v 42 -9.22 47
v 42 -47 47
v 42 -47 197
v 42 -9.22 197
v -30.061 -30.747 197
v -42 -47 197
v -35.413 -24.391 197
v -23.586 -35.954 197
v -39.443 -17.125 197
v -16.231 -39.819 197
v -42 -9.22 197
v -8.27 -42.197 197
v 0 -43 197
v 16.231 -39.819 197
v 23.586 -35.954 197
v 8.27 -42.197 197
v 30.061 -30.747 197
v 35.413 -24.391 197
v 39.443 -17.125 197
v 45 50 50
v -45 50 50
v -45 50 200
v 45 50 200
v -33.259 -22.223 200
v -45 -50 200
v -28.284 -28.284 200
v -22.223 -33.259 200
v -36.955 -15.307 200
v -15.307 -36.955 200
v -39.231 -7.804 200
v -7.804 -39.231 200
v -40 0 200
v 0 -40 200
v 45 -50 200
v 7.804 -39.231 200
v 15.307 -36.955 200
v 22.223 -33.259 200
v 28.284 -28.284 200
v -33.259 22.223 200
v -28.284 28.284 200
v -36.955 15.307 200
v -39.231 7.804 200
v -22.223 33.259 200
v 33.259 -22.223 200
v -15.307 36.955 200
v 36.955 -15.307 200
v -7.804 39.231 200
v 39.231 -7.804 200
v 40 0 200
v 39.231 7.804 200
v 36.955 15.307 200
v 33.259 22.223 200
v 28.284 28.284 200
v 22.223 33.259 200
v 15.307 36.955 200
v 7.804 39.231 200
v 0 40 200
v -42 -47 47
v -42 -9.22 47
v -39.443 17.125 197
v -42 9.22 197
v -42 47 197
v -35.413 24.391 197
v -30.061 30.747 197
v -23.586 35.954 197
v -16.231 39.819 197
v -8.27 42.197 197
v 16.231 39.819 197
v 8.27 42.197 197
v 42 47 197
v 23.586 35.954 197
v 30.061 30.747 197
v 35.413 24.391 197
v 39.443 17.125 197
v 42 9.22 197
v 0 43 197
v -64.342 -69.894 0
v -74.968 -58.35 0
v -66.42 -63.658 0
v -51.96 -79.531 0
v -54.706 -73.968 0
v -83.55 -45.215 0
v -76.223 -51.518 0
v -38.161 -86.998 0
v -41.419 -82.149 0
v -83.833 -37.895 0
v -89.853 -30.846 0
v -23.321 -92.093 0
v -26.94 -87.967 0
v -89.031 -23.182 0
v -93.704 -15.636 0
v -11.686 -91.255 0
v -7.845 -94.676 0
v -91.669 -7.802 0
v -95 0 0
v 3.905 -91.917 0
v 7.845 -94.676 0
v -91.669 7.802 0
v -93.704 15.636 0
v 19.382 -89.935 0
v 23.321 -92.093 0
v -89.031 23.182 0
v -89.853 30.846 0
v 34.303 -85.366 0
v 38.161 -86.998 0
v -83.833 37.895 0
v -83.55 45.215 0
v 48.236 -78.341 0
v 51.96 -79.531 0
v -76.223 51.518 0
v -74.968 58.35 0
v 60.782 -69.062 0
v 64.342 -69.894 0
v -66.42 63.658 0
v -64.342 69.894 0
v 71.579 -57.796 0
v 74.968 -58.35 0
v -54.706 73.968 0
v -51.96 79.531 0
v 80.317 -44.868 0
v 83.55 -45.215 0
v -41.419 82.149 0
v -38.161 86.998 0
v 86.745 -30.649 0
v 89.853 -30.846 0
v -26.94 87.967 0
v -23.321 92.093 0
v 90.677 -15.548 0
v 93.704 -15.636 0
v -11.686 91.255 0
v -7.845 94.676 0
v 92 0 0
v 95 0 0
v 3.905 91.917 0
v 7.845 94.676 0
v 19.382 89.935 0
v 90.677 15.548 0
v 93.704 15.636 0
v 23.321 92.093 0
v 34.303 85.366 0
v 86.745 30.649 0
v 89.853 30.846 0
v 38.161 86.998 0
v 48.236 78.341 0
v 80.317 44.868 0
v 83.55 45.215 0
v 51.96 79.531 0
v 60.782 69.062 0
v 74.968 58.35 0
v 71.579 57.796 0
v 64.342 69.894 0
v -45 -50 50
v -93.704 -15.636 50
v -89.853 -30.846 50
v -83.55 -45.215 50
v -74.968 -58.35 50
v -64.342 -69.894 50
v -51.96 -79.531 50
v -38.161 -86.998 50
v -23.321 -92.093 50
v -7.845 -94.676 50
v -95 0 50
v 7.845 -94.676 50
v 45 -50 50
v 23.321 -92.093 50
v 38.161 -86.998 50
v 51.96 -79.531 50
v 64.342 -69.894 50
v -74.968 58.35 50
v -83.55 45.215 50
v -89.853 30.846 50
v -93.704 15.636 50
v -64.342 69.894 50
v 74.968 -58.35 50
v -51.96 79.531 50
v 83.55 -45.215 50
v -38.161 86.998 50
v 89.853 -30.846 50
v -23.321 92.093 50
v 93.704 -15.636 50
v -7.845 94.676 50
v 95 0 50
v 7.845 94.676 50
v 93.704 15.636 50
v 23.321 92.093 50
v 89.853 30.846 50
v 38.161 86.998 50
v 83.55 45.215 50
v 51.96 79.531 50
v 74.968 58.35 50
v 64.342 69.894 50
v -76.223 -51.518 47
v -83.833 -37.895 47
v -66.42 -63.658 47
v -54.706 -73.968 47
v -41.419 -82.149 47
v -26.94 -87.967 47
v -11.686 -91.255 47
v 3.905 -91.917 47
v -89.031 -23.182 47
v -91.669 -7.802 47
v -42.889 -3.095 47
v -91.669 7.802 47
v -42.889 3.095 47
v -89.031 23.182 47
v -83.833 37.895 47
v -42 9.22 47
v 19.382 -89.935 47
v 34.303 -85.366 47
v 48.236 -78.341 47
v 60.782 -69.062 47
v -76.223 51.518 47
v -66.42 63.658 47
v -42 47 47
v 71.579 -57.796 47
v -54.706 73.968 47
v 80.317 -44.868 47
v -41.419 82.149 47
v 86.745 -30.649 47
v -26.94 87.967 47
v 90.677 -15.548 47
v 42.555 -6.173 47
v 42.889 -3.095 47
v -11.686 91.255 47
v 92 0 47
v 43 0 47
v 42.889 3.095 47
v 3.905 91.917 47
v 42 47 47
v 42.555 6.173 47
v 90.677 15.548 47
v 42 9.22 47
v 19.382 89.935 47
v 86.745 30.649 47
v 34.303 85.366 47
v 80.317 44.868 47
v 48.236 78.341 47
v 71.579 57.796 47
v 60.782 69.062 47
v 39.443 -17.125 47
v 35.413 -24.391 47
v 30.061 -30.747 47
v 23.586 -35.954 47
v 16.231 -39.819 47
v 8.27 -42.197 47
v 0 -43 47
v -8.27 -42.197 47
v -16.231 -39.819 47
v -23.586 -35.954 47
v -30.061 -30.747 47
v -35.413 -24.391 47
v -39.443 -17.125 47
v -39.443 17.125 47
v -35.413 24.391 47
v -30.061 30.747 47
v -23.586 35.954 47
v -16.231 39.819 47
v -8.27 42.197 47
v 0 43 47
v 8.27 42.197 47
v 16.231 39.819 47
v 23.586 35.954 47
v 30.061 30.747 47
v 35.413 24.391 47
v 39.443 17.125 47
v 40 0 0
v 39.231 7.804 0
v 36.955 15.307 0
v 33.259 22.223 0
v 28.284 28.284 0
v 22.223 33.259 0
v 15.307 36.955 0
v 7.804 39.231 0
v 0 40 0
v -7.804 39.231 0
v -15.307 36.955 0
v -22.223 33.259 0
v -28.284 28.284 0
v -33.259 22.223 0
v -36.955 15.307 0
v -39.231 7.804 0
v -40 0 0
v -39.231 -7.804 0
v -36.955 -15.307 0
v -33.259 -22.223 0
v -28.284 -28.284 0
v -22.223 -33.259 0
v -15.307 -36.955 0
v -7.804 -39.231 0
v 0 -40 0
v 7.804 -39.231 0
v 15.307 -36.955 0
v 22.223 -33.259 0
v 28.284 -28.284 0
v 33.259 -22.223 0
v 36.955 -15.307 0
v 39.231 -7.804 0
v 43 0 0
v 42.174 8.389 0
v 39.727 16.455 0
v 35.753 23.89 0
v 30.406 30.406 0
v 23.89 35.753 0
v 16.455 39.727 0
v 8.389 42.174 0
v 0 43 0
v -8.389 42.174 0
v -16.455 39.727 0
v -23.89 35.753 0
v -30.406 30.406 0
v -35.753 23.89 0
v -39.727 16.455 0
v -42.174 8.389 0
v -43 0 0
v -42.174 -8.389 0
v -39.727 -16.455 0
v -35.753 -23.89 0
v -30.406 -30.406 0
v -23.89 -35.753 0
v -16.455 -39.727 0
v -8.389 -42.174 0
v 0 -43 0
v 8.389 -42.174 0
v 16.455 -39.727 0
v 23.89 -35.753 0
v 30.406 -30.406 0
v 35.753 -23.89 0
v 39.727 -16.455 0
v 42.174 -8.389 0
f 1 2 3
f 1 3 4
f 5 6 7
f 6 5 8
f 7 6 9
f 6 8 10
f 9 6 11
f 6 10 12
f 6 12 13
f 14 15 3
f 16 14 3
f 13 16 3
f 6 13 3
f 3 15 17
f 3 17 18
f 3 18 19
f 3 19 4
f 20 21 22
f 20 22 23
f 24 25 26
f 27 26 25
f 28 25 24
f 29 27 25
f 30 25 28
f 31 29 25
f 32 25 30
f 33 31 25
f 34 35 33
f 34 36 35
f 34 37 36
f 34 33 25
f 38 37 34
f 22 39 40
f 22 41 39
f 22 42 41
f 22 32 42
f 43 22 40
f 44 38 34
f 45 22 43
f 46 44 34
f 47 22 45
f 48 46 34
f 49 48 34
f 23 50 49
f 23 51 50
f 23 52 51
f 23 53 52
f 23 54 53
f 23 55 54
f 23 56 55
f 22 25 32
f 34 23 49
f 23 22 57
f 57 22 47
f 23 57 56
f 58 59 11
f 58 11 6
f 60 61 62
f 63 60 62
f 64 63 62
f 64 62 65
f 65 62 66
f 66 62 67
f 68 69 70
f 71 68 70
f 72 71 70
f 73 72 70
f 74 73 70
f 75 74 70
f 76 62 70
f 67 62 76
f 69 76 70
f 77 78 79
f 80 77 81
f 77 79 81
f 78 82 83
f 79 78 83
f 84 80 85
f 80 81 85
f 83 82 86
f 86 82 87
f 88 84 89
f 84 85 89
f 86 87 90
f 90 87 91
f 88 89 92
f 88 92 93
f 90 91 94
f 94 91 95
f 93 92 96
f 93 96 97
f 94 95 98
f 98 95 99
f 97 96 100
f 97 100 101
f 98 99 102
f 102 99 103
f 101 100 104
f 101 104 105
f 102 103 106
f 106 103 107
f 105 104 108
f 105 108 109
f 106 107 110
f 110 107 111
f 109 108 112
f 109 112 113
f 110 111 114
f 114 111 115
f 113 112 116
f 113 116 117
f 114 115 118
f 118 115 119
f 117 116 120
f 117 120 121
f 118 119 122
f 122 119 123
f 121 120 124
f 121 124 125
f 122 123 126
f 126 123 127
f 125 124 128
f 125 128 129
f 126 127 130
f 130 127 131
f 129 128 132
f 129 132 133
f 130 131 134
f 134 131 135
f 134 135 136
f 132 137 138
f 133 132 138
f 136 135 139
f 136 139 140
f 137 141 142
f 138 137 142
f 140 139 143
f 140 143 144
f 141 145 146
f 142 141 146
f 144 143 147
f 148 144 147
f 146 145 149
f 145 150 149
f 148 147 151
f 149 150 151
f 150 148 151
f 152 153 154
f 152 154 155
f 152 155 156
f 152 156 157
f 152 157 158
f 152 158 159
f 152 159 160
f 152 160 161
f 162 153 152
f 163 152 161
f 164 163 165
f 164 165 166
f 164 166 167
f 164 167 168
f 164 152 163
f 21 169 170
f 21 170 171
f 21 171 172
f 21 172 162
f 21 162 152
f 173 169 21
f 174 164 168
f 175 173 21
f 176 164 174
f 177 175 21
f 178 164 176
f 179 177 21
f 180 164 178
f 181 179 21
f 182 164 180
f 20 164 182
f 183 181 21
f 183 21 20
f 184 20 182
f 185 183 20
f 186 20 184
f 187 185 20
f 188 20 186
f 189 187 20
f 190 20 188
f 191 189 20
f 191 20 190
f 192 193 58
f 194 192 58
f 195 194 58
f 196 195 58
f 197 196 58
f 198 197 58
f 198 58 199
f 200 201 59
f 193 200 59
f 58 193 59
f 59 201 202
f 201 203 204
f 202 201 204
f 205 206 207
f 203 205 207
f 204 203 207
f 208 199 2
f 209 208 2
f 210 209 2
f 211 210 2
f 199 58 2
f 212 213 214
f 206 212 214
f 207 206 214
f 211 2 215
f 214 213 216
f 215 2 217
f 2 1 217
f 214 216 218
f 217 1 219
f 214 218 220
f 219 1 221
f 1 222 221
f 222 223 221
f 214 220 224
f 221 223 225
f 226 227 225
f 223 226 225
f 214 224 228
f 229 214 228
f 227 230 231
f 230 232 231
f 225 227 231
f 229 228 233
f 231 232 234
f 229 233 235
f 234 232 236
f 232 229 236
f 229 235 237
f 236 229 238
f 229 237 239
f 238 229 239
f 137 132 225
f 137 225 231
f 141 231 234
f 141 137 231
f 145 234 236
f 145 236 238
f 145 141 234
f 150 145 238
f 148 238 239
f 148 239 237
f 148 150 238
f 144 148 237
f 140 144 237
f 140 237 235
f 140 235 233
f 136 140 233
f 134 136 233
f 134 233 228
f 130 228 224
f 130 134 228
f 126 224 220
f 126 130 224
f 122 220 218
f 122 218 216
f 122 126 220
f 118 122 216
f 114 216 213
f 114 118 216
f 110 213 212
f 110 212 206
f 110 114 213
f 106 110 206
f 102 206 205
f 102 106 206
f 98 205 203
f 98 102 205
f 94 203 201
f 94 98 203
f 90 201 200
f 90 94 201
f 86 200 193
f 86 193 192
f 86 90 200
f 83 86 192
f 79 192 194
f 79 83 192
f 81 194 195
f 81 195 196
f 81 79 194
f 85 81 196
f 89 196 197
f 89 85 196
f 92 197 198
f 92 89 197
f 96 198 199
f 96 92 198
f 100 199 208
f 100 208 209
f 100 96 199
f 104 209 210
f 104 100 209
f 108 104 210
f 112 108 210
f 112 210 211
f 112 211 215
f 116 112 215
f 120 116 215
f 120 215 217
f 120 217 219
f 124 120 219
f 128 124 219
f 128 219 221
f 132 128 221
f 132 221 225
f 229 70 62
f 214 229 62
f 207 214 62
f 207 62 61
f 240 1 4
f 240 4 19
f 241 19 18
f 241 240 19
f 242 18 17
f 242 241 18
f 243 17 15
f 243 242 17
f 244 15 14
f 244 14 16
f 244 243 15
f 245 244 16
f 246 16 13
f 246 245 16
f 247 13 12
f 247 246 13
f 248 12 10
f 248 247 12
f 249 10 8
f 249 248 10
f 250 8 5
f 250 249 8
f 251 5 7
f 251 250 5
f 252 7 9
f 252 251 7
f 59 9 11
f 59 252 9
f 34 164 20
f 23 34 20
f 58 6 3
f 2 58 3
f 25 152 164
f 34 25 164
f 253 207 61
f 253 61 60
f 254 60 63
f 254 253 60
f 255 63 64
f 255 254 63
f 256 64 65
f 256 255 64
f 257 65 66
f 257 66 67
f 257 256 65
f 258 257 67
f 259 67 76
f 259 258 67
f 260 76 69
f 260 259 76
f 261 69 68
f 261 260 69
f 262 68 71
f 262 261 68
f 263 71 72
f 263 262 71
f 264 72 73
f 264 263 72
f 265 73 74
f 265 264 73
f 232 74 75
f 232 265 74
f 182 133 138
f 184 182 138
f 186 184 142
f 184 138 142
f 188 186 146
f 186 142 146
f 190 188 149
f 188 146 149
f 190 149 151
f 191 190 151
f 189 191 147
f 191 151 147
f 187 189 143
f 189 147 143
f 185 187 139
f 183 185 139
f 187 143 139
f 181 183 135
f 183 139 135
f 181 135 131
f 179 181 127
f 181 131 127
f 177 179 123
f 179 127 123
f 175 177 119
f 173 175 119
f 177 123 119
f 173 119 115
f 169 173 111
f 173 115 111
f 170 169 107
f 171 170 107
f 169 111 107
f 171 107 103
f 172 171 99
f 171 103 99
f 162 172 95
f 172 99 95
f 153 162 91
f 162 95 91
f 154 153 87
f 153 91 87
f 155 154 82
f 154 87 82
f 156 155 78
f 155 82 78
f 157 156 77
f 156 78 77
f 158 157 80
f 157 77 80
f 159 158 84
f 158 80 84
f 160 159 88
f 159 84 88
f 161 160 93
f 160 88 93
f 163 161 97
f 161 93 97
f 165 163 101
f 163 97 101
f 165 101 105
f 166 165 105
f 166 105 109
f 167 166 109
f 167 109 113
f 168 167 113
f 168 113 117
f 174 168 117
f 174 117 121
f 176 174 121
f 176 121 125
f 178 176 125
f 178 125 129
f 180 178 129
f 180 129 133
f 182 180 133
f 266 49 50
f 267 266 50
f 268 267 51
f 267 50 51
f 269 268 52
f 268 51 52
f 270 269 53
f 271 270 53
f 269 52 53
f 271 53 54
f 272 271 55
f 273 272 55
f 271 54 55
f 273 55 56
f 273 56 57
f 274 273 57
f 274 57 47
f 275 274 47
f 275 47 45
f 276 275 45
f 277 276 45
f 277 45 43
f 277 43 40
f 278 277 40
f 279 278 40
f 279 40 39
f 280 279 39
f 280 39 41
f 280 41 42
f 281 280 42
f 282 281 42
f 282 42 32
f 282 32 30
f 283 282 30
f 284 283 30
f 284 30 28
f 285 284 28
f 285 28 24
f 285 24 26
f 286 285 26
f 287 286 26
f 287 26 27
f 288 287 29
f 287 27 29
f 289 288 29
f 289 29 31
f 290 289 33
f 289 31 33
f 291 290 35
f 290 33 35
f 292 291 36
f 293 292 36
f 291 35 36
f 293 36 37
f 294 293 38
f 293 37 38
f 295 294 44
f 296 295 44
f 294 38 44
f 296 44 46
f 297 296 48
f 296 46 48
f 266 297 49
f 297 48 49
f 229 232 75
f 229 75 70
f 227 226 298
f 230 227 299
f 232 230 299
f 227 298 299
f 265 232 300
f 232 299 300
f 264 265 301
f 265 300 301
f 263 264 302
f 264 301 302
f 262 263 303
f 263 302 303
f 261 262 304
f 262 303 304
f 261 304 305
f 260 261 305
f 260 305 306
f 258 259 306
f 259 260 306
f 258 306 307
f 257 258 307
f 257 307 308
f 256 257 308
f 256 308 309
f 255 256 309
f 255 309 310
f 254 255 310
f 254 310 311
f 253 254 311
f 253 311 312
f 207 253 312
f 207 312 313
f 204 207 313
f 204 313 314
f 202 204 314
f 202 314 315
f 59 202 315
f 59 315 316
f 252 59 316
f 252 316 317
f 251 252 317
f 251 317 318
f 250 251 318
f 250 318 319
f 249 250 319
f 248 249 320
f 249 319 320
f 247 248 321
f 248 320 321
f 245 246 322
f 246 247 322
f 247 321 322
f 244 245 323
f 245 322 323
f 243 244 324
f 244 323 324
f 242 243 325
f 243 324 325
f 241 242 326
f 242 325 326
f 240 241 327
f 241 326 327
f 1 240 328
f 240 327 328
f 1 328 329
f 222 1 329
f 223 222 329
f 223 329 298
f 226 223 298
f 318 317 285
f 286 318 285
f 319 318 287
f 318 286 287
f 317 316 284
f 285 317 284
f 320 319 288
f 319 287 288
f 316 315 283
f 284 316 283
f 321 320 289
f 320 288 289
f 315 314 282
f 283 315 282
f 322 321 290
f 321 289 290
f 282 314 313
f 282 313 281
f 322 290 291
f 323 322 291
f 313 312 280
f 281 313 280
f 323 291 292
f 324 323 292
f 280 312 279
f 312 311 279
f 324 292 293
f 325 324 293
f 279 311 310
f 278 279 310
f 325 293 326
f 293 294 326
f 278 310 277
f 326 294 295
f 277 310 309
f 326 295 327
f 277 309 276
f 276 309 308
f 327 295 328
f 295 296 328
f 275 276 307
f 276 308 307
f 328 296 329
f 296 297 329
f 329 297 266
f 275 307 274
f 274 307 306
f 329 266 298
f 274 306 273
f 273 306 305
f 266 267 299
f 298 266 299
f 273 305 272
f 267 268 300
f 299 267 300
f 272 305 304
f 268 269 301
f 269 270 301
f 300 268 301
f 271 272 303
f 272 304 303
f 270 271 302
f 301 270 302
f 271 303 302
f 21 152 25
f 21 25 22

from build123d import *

# Parameters (mm, degrees)
SKETCH_1_R          = 95
EXTRUDE_1_DEPTH     = 50
SKETCH_2_W          = 90
SKETCH_2_H          = 100
EXTRUDE_2_DEPTH     = 150
SKETCH_3_R          = 40
CUT_EXTRUDE_1_DEPTH = 241.935676063
SHELL_1_OUTLINE_R   = 92
SHELL_1_OUTLINE_R_2 = 43
SHELL_1_DEPTH       = 47
SHELL_START         = 47
SHELL_1_2_DEPTH     = 150


# Read off the part's stored shape, not the designer's step: Оболочка1
with BuildPart() as part:
    # Эскиз1 → Бобышка-Вытянуть1 (new body)
    with BuildSketch(Plane.XY):
        Circle(SKETCH_1_R)
    extrude(amount=EXTRUDE_1_DEPTH)

    # Эскиз2 → Бобышка-Вытянуть2 (add)
    with BuildSketch(Plane.XY.offset(50)):
        Rectangle(SKETCH_2_W, SKETCH_2_H)
    extrude(amount=EXTRUDE_2_DEPTH)

    # Эскиз3 → Вырез-Вытянуть1 (cut, through all)
    with BuildSketch(Plane.XY.offset(200)):
        Circle(SKETCH_3_R)
    extrude(amount=-CUT_EXTRUDE_1_DEPTH, mode=Mode.SUBTRACT)

    # Оболочка1 outline → Оболочка1 (cut)
    with BuildSketch(Plane.XY):
        Circle(SHELL_1_OUTLINE_R)
        Circle(SHELL_1_OUTLINE_R_2, mode=Mode.SUBTRACT)
    extrude(amount=SHELL_1_DEPTH, mode=Mode.SUBTRACT)

    # Shell 1 2 outline → Shell 1 2 (cut)
    with BuildSketch(Plane.XY.offset(SHELL_START)):
        with BuildLine():
            ThreePointArc((-42, 9.219544457), (0, 43), (42, 9.219544457))
            Line((42, 9.219544457), (42, 47))
            Line((42, 47), (-42, 47))
            Line((-42, 47), (-42, 9.219544457))
        make_face()
        with BuildLine():
            Line((42, -47), (42, -9.219544457))
            ThreePointArc((42, -9.219544457), (0, -43), (-42, -9.219544457))
            Line((-42, -9.219544457), (-42, -47))
            Line((-42, -47), (42, -47))
        make_face()
    extrude(amount=SHELL_1_2_DEPTH, mode=Mode.SUBTRACT)


solid = part.part
